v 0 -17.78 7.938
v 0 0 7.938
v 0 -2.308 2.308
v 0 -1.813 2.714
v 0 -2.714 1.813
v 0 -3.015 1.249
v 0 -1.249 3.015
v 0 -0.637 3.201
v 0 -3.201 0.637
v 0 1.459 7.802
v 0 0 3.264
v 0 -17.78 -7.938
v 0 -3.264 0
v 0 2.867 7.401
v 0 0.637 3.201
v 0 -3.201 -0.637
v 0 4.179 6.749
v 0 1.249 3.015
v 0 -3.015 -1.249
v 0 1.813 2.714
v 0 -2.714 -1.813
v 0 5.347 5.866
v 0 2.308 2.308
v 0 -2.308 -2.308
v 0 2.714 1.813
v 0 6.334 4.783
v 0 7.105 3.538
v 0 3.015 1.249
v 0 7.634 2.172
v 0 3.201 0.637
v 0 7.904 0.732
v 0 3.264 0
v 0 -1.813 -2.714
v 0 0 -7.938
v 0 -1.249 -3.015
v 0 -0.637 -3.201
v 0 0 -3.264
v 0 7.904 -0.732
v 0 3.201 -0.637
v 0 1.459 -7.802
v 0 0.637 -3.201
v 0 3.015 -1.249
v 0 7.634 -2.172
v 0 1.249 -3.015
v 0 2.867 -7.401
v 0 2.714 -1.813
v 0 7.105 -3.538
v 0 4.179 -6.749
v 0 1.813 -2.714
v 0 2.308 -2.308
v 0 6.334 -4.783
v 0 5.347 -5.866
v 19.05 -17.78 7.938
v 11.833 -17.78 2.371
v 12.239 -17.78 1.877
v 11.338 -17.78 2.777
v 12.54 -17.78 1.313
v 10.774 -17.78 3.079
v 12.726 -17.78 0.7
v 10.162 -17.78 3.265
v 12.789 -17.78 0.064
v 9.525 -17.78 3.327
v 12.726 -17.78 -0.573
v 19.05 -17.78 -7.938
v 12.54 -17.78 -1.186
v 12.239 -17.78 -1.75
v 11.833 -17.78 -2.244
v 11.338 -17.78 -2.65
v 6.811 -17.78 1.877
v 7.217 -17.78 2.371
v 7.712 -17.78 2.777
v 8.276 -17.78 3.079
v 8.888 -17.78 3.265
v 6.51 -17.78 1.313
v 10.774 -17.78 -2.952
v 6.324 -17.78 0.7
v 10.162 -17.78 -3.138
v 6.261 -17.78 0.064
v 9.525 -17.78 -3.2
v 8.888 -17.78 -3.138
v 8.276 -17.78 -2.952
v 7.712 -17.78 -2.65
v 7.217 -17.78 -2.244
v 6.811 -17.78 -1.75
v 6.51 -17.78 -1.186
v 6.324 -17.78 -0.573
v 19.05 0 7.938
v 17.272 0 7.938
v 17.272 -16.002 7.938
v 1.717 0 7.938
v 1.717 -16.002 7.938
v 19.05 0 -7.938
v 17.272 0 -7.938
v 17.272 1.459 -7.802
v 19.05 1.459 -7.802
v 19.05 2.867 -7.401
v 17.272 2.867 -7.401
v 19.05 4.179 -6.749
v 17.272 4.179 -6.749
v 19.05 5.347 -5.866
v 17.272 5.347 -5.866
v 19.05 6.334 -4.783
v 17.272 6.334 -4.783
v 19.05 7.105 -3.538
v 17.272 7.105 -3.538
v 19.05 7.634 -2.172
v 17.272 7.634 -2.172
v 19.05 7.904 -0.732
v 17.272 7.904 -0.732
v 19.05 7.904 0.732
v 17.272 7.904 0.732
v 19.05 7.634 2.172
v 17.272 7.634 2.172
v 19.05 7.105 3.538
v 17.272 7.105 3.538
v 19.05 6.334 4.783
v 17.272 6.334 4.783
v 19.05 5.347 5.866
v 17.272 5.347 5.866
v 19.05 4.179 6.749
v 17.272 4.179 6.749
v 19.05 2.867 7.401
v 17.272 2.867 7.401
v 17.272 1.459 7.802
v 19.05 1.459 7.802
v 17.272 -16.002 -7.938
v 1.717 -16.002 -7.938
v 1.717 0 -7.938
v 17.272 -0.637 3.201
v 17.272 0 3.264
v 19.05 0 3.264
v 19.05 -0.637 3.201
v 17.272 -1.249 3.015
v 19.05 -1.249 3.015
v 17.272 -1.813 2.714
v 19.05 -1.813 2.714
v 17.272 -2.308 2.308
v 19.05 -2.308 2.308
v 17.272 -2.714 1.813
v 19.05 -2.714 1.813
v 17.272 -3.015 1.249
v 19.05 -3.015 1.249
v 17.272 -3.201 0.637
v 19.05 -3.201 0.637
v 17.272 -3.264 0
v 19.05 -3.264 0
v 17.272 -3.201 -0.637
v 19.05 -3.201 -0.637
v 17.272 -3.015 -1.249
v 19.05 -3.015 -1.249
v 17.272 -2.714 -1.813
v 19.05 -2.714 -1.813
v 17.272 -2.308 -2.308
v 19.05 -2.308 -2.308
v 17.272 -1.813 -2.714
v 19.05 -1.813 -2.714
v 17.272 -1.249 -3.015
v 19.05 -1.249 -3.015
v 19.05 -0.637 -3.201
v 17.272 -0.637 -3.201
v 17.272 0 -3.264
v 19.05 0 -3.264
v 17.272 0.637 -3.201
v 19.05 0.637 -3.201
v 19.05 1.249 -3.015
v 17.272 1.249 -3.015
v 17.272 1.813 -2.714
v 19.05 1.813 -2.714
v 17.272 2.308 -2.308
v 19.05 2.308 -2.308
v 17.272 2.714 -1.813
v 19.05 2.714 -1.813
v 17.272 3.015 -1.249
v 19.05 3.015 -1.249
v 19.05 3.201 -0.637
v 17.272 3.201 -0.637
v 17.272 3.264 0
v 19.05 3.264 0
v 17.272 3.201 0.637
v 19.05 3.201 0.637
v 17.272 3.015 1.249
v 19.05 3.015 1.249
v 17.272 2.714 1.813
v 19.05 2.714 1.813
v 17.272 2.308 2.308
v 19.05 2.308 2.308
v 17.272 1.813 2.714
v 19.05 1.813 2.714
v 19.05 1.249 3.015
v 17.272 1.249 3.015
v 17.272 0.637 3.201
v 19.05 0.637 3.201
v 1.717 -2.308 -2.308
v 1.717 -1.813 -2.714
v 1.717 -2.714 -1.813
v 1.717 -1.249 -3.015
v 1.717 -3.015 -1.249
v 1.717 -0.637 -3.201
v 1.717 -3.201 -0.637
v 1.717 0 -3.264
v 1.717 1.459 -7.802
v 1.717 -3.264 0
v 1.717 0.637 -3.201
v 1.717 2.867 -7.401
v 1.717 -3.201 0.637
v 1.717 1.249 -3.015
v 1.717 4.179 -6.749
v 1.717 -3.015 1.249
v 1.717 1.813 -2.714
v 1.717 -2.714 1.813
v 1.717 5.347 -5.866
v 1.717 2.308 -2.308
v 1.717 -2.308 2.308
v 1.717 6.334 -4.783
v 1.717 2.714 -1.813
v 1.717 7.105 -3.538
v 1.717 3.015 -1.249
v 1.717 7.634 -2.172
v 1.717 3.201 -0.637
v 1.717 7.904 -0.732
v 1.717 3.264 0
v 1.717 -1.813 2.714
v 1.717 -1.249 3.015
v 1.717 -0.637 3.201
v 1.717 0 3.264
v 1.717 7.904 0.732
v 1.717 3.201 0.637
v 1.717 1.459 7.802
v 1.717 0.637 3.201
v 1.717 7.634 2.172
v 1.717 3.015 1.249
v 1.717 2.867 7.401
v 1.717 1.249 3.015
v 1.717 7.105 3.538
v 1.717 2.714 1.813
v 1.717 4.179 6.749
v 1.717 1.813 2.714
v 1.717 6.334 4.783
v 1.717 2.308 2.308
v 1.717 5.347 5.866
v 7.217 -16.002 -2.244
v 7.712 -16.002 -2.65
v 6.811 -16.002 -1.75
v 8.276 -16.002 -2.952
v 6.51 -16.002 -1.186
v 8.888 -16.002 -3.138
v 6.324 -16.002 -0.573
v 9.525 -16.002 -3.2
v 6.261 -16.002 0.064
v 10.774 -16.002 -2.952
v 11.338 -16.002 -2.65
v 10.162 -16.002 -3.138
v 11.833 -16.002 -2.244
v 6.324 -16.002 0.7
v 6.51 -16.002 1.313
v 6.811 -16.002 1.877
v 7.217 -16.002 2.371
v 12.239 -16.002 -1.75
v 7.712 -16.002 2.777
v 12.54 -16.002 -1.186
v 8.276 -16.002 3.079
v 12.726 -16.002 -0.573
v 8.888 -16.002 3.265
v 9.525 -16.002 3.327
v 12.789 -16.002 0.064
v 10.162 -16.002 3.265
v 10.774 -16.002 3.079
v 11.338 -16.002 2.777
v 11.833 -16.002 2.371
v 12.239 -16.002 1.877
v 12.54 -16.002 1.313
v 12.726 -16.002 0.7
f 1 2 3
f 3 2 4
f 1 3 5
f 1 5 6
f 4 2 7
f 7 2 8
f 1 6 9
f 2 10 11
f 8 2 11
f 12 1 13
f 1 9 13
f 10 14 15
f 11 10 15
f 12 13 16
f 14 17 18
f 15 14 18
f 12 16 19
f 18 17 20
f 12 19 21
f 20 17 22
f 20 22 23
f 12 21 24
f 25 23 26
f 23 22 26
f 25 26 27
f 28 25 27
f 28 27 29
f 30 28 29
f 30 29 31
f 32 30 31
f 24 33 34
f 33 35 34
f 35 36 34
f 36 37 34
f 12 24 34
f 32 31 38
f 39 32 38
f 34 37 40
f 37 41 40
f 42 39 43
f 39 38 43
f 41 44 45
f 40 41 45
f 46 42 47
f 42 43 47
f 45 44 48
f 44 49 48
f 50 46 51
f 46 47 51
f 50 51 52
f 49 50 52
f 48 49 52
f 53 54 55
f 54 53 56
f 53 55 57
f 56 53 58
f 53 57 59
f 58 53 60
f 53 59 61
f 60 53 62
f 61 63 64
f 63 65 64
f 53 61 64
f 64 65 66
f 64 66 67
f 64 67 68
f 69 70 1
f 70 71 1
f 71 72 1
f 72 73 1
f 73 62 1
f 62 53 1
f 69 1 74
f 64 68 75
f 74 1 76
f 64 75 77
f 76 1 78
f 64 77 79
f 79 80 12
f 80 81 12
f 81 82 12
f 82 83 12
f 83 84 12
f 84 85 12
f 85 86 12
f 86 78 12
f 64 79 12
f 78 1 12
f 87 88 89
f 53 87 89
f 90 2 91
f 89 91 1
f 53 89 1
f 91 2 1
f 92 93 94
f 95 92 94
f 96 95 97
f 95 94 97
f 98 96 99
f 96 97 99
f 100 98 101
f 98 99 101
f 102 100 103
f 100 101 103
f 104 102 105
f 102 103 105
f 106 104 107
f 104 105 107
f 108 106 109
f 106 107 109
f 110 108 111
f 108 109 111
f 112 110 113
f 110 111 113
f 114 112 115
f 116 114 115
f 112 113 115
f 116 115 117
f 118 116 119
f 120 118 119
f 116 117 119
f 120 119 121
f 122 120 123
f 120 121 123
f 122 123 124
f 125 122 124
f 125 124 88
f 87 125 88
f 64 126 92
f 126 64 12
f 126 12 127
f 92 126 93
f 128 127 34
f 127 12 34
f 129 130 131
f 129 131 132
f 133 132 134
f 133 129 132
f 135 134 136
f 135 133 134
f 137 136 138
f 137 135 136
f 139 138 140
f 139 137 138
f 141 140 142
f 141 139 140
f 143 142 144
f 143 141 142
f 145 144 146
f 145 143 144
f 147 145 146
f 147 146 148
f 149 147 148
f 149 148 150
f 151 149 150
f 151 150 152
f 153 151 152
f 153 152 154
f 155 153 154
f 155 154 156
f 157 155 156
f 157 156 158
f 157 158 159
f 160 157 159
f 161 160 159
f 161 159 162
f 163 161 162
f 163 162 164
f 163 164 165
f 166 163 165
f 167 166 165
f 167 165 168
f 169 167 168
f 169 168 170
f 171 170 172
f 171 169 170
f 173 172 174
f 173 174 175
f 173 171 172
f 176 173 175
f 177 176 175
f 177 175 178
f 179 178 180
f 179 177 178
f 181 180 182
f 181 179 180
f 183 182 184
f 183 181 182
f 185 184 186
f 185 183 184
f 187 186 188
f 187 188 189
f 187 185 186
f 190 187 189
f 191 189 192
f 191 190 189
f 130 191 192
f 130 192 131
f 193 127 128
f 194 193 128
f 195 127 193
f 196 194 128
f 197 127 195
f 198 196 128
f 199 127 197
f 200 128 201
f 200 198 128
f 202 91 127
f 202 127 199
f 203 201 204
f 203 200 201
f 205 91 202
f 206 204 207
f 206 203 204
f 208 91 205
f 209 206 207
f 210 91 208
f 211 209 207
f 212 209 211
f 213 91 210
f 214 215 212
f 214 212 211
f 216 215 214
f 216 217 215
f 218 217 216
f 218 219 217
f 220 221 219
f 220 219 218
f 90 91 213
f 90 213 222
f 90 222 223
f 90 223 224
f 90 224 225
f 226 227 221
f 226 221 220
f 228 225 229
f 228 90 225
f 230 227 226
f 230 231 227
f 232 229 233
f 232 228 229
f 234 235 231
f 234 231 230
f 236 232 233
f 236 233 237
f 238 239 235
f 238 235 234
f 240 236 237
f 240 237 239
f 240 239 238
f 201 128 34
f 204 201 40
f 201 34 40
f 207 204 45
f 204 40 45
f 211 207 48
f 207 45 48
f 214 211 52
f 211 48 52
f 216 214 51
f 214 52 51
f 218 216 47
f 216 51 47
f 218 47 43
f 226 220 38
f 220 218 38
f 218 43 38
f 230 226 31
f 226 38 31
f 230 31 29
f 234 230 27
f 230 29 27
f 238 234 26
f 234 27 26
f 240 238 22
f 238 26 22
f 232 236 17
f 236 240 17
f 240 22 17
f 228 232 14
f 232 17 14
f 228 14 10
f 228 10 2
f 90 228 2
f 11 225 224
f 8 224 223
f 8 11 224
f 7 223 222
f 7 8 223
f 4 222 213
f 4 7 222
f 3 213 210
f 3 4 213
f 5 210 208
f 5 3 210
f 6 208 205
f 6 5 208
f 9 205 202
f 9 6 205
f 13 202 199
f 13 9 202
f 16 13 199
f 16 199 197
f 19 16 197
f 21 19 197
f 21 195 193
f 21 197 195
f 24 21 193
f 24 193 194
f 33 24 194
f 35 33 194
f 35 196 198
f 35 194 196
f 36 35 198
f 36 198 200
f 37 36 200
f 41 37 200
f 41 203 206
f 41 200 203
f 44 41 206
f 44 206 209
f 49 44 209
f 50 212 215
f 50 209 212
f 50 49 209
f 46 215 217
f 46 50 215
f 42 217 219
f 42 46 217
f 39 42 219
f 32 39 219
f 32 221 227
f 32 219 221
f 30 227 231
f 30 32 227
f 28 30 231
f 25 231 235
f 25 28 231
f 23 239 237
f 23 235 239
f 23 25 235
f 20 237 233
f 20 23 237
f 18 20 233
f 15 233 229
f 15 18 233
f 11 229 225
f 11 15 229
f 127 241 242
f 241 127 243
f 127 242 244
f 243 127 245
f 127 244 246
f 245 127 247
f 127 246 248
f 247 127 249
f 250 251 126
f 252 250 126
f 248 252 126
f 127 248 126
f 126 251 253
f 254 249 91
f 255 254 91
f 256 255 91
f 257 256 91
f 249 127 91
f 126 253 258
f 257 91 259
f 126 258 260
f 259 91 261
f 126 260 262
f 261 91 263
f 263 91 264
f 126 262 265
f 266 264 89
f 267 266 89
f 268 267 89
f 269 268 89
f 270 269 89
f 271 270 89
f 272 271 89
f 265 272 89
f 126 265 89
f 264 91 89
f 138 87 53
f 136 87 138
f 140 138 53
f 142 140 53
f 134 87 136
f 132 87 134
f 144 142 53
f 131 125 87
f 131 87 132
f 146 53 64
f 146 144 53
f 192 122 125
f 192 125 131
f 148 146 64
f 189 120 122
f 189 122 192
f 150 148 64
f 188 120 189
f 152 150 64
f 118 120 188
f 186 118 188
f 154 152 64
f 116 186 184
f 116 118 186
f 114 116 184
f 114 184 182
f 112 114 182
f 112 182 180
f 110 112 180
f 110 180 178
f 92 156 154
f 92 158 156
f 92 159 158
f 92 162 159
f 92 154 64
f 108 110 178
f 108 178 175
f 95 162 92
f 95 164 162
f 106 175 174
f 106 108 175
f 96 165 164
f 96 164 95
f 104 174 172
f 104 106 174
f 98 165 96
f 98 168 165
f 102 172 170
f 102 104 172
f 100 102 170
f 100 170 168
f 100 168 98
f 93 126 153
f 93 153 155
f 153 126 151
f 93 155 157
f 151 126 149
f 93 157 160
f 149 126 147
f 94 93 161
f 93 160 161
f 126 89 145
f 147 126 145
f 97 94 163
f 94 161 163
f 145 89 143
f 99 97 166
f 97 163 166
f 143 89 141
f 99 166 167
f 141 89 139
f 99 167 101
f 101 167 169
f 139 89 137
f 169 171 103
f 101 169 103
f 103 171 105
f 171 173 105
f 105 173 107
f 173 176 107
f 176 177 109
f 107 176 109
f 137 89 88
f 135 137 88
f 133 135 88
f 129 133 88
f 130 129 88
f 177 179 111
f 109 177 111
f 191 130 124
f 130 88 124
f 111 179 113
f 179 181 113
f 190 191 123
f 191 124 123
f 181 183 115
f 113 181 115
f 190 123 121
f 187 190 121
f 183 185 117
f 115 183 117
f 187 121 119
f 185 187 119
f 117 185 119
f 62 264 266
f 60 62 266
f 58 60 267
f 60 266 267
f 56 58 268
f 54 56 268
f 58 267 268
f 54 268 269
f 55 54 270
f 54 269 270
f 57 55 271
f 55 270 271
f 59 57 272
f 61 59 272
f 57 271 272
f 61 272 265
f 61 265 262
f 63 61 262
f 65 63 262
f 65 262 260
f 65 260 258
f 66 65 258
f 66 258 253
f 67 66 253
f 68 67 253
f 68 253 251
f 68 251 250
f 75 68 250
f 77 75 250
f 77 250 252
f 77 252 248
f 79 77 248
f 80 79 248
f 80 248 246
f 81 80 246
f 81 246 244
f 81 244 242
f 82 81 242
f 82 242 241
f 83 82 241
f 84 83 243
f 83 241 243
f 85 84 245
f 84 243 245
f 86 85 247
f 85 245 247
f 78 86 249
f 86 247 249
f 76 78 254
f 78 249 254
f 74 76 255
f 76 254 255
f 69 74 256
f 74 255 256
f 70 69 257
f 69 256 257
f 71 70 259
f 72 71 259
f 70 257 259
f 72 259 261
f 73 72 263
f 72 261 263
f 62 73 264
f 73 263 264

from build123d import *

# Parameters (mm, degrees)
SKETCH2_R           = 7.9375
SKETCH2_R_2         = 3.2639
BOSS_EXTRUDE1_DEPTH = 19.05
SKETCH3_W           = 15.555026682
SKETCH3_H           = 25.4
CUT_EXTRUDE1_DEPTH  = 12.7
SKETCH4_R           = 3.2639
CUT_EXTRUDE2_DEPTH  = 28.240315825


with BuildPart() as part:
    # Sketch2 → Boss-Extrude1 (new body)
    # profile 1 of 2: a face of its own
    with BuildSketch(Plane(origin=(0, 0, 0), x_dir=(0, 0, -1), z_dir=(1, 0, 0))):
        with BuildLine():
            ThreePointArc((7.9375, 0), (0, -7.9375), (-7.9375, 0))
            Line((-7.9375, 0), (-7.9375, -17.78))
            Line((-7.9375, -17.78), (7.9375, -17.78))
            Line((7.9375, -17.78), (7.9375, 0))
        make_face()
    # profile 2 of 2: a face of its own
    with BuildSketch(Plane(origin=(0, 0, 0), x_dir=(0, 0, -1), z_dir=(1, 0, 0))):
        Circle(SKETCH2_R)
        with Locations(Location((0, 0, 0), (0, 0, 180))):
            Circle(SKETCH2_R_2, mode=Mode.SUBTRACT)
    extrude(amount=BOSS_EXTRUDE1_DEPTH)

    # Sketch3 → Cut-Extrude1 (cut, symmetric)
    with BuildSketch(Plane.XY):
        with Locations((9.494486659, -3.302)):
            Rectangle(SKETCH3_W, SKETCH3_H)
    extrude(amount=CUT_EXTRUDE1_DEPTH, both=True, mode=Mode.SUBTRACT)

    # Sketch4 → Cut-Extrude2 (cut, through all)
    with BuildSketch(Plane(origin=(0, 0, 0), x_dir=(1, 0, 0), z_dir=(0, 1, 0))):
        with Locations(Location((9.525, -0.0635, 0), (0, 0, 270))):
            Circle(SKETCH4_R)
    extrude(amount=-CUT_EXTRUDE2_DEPTH, mode=Mode.SUBTRACT)


solid = part.part
